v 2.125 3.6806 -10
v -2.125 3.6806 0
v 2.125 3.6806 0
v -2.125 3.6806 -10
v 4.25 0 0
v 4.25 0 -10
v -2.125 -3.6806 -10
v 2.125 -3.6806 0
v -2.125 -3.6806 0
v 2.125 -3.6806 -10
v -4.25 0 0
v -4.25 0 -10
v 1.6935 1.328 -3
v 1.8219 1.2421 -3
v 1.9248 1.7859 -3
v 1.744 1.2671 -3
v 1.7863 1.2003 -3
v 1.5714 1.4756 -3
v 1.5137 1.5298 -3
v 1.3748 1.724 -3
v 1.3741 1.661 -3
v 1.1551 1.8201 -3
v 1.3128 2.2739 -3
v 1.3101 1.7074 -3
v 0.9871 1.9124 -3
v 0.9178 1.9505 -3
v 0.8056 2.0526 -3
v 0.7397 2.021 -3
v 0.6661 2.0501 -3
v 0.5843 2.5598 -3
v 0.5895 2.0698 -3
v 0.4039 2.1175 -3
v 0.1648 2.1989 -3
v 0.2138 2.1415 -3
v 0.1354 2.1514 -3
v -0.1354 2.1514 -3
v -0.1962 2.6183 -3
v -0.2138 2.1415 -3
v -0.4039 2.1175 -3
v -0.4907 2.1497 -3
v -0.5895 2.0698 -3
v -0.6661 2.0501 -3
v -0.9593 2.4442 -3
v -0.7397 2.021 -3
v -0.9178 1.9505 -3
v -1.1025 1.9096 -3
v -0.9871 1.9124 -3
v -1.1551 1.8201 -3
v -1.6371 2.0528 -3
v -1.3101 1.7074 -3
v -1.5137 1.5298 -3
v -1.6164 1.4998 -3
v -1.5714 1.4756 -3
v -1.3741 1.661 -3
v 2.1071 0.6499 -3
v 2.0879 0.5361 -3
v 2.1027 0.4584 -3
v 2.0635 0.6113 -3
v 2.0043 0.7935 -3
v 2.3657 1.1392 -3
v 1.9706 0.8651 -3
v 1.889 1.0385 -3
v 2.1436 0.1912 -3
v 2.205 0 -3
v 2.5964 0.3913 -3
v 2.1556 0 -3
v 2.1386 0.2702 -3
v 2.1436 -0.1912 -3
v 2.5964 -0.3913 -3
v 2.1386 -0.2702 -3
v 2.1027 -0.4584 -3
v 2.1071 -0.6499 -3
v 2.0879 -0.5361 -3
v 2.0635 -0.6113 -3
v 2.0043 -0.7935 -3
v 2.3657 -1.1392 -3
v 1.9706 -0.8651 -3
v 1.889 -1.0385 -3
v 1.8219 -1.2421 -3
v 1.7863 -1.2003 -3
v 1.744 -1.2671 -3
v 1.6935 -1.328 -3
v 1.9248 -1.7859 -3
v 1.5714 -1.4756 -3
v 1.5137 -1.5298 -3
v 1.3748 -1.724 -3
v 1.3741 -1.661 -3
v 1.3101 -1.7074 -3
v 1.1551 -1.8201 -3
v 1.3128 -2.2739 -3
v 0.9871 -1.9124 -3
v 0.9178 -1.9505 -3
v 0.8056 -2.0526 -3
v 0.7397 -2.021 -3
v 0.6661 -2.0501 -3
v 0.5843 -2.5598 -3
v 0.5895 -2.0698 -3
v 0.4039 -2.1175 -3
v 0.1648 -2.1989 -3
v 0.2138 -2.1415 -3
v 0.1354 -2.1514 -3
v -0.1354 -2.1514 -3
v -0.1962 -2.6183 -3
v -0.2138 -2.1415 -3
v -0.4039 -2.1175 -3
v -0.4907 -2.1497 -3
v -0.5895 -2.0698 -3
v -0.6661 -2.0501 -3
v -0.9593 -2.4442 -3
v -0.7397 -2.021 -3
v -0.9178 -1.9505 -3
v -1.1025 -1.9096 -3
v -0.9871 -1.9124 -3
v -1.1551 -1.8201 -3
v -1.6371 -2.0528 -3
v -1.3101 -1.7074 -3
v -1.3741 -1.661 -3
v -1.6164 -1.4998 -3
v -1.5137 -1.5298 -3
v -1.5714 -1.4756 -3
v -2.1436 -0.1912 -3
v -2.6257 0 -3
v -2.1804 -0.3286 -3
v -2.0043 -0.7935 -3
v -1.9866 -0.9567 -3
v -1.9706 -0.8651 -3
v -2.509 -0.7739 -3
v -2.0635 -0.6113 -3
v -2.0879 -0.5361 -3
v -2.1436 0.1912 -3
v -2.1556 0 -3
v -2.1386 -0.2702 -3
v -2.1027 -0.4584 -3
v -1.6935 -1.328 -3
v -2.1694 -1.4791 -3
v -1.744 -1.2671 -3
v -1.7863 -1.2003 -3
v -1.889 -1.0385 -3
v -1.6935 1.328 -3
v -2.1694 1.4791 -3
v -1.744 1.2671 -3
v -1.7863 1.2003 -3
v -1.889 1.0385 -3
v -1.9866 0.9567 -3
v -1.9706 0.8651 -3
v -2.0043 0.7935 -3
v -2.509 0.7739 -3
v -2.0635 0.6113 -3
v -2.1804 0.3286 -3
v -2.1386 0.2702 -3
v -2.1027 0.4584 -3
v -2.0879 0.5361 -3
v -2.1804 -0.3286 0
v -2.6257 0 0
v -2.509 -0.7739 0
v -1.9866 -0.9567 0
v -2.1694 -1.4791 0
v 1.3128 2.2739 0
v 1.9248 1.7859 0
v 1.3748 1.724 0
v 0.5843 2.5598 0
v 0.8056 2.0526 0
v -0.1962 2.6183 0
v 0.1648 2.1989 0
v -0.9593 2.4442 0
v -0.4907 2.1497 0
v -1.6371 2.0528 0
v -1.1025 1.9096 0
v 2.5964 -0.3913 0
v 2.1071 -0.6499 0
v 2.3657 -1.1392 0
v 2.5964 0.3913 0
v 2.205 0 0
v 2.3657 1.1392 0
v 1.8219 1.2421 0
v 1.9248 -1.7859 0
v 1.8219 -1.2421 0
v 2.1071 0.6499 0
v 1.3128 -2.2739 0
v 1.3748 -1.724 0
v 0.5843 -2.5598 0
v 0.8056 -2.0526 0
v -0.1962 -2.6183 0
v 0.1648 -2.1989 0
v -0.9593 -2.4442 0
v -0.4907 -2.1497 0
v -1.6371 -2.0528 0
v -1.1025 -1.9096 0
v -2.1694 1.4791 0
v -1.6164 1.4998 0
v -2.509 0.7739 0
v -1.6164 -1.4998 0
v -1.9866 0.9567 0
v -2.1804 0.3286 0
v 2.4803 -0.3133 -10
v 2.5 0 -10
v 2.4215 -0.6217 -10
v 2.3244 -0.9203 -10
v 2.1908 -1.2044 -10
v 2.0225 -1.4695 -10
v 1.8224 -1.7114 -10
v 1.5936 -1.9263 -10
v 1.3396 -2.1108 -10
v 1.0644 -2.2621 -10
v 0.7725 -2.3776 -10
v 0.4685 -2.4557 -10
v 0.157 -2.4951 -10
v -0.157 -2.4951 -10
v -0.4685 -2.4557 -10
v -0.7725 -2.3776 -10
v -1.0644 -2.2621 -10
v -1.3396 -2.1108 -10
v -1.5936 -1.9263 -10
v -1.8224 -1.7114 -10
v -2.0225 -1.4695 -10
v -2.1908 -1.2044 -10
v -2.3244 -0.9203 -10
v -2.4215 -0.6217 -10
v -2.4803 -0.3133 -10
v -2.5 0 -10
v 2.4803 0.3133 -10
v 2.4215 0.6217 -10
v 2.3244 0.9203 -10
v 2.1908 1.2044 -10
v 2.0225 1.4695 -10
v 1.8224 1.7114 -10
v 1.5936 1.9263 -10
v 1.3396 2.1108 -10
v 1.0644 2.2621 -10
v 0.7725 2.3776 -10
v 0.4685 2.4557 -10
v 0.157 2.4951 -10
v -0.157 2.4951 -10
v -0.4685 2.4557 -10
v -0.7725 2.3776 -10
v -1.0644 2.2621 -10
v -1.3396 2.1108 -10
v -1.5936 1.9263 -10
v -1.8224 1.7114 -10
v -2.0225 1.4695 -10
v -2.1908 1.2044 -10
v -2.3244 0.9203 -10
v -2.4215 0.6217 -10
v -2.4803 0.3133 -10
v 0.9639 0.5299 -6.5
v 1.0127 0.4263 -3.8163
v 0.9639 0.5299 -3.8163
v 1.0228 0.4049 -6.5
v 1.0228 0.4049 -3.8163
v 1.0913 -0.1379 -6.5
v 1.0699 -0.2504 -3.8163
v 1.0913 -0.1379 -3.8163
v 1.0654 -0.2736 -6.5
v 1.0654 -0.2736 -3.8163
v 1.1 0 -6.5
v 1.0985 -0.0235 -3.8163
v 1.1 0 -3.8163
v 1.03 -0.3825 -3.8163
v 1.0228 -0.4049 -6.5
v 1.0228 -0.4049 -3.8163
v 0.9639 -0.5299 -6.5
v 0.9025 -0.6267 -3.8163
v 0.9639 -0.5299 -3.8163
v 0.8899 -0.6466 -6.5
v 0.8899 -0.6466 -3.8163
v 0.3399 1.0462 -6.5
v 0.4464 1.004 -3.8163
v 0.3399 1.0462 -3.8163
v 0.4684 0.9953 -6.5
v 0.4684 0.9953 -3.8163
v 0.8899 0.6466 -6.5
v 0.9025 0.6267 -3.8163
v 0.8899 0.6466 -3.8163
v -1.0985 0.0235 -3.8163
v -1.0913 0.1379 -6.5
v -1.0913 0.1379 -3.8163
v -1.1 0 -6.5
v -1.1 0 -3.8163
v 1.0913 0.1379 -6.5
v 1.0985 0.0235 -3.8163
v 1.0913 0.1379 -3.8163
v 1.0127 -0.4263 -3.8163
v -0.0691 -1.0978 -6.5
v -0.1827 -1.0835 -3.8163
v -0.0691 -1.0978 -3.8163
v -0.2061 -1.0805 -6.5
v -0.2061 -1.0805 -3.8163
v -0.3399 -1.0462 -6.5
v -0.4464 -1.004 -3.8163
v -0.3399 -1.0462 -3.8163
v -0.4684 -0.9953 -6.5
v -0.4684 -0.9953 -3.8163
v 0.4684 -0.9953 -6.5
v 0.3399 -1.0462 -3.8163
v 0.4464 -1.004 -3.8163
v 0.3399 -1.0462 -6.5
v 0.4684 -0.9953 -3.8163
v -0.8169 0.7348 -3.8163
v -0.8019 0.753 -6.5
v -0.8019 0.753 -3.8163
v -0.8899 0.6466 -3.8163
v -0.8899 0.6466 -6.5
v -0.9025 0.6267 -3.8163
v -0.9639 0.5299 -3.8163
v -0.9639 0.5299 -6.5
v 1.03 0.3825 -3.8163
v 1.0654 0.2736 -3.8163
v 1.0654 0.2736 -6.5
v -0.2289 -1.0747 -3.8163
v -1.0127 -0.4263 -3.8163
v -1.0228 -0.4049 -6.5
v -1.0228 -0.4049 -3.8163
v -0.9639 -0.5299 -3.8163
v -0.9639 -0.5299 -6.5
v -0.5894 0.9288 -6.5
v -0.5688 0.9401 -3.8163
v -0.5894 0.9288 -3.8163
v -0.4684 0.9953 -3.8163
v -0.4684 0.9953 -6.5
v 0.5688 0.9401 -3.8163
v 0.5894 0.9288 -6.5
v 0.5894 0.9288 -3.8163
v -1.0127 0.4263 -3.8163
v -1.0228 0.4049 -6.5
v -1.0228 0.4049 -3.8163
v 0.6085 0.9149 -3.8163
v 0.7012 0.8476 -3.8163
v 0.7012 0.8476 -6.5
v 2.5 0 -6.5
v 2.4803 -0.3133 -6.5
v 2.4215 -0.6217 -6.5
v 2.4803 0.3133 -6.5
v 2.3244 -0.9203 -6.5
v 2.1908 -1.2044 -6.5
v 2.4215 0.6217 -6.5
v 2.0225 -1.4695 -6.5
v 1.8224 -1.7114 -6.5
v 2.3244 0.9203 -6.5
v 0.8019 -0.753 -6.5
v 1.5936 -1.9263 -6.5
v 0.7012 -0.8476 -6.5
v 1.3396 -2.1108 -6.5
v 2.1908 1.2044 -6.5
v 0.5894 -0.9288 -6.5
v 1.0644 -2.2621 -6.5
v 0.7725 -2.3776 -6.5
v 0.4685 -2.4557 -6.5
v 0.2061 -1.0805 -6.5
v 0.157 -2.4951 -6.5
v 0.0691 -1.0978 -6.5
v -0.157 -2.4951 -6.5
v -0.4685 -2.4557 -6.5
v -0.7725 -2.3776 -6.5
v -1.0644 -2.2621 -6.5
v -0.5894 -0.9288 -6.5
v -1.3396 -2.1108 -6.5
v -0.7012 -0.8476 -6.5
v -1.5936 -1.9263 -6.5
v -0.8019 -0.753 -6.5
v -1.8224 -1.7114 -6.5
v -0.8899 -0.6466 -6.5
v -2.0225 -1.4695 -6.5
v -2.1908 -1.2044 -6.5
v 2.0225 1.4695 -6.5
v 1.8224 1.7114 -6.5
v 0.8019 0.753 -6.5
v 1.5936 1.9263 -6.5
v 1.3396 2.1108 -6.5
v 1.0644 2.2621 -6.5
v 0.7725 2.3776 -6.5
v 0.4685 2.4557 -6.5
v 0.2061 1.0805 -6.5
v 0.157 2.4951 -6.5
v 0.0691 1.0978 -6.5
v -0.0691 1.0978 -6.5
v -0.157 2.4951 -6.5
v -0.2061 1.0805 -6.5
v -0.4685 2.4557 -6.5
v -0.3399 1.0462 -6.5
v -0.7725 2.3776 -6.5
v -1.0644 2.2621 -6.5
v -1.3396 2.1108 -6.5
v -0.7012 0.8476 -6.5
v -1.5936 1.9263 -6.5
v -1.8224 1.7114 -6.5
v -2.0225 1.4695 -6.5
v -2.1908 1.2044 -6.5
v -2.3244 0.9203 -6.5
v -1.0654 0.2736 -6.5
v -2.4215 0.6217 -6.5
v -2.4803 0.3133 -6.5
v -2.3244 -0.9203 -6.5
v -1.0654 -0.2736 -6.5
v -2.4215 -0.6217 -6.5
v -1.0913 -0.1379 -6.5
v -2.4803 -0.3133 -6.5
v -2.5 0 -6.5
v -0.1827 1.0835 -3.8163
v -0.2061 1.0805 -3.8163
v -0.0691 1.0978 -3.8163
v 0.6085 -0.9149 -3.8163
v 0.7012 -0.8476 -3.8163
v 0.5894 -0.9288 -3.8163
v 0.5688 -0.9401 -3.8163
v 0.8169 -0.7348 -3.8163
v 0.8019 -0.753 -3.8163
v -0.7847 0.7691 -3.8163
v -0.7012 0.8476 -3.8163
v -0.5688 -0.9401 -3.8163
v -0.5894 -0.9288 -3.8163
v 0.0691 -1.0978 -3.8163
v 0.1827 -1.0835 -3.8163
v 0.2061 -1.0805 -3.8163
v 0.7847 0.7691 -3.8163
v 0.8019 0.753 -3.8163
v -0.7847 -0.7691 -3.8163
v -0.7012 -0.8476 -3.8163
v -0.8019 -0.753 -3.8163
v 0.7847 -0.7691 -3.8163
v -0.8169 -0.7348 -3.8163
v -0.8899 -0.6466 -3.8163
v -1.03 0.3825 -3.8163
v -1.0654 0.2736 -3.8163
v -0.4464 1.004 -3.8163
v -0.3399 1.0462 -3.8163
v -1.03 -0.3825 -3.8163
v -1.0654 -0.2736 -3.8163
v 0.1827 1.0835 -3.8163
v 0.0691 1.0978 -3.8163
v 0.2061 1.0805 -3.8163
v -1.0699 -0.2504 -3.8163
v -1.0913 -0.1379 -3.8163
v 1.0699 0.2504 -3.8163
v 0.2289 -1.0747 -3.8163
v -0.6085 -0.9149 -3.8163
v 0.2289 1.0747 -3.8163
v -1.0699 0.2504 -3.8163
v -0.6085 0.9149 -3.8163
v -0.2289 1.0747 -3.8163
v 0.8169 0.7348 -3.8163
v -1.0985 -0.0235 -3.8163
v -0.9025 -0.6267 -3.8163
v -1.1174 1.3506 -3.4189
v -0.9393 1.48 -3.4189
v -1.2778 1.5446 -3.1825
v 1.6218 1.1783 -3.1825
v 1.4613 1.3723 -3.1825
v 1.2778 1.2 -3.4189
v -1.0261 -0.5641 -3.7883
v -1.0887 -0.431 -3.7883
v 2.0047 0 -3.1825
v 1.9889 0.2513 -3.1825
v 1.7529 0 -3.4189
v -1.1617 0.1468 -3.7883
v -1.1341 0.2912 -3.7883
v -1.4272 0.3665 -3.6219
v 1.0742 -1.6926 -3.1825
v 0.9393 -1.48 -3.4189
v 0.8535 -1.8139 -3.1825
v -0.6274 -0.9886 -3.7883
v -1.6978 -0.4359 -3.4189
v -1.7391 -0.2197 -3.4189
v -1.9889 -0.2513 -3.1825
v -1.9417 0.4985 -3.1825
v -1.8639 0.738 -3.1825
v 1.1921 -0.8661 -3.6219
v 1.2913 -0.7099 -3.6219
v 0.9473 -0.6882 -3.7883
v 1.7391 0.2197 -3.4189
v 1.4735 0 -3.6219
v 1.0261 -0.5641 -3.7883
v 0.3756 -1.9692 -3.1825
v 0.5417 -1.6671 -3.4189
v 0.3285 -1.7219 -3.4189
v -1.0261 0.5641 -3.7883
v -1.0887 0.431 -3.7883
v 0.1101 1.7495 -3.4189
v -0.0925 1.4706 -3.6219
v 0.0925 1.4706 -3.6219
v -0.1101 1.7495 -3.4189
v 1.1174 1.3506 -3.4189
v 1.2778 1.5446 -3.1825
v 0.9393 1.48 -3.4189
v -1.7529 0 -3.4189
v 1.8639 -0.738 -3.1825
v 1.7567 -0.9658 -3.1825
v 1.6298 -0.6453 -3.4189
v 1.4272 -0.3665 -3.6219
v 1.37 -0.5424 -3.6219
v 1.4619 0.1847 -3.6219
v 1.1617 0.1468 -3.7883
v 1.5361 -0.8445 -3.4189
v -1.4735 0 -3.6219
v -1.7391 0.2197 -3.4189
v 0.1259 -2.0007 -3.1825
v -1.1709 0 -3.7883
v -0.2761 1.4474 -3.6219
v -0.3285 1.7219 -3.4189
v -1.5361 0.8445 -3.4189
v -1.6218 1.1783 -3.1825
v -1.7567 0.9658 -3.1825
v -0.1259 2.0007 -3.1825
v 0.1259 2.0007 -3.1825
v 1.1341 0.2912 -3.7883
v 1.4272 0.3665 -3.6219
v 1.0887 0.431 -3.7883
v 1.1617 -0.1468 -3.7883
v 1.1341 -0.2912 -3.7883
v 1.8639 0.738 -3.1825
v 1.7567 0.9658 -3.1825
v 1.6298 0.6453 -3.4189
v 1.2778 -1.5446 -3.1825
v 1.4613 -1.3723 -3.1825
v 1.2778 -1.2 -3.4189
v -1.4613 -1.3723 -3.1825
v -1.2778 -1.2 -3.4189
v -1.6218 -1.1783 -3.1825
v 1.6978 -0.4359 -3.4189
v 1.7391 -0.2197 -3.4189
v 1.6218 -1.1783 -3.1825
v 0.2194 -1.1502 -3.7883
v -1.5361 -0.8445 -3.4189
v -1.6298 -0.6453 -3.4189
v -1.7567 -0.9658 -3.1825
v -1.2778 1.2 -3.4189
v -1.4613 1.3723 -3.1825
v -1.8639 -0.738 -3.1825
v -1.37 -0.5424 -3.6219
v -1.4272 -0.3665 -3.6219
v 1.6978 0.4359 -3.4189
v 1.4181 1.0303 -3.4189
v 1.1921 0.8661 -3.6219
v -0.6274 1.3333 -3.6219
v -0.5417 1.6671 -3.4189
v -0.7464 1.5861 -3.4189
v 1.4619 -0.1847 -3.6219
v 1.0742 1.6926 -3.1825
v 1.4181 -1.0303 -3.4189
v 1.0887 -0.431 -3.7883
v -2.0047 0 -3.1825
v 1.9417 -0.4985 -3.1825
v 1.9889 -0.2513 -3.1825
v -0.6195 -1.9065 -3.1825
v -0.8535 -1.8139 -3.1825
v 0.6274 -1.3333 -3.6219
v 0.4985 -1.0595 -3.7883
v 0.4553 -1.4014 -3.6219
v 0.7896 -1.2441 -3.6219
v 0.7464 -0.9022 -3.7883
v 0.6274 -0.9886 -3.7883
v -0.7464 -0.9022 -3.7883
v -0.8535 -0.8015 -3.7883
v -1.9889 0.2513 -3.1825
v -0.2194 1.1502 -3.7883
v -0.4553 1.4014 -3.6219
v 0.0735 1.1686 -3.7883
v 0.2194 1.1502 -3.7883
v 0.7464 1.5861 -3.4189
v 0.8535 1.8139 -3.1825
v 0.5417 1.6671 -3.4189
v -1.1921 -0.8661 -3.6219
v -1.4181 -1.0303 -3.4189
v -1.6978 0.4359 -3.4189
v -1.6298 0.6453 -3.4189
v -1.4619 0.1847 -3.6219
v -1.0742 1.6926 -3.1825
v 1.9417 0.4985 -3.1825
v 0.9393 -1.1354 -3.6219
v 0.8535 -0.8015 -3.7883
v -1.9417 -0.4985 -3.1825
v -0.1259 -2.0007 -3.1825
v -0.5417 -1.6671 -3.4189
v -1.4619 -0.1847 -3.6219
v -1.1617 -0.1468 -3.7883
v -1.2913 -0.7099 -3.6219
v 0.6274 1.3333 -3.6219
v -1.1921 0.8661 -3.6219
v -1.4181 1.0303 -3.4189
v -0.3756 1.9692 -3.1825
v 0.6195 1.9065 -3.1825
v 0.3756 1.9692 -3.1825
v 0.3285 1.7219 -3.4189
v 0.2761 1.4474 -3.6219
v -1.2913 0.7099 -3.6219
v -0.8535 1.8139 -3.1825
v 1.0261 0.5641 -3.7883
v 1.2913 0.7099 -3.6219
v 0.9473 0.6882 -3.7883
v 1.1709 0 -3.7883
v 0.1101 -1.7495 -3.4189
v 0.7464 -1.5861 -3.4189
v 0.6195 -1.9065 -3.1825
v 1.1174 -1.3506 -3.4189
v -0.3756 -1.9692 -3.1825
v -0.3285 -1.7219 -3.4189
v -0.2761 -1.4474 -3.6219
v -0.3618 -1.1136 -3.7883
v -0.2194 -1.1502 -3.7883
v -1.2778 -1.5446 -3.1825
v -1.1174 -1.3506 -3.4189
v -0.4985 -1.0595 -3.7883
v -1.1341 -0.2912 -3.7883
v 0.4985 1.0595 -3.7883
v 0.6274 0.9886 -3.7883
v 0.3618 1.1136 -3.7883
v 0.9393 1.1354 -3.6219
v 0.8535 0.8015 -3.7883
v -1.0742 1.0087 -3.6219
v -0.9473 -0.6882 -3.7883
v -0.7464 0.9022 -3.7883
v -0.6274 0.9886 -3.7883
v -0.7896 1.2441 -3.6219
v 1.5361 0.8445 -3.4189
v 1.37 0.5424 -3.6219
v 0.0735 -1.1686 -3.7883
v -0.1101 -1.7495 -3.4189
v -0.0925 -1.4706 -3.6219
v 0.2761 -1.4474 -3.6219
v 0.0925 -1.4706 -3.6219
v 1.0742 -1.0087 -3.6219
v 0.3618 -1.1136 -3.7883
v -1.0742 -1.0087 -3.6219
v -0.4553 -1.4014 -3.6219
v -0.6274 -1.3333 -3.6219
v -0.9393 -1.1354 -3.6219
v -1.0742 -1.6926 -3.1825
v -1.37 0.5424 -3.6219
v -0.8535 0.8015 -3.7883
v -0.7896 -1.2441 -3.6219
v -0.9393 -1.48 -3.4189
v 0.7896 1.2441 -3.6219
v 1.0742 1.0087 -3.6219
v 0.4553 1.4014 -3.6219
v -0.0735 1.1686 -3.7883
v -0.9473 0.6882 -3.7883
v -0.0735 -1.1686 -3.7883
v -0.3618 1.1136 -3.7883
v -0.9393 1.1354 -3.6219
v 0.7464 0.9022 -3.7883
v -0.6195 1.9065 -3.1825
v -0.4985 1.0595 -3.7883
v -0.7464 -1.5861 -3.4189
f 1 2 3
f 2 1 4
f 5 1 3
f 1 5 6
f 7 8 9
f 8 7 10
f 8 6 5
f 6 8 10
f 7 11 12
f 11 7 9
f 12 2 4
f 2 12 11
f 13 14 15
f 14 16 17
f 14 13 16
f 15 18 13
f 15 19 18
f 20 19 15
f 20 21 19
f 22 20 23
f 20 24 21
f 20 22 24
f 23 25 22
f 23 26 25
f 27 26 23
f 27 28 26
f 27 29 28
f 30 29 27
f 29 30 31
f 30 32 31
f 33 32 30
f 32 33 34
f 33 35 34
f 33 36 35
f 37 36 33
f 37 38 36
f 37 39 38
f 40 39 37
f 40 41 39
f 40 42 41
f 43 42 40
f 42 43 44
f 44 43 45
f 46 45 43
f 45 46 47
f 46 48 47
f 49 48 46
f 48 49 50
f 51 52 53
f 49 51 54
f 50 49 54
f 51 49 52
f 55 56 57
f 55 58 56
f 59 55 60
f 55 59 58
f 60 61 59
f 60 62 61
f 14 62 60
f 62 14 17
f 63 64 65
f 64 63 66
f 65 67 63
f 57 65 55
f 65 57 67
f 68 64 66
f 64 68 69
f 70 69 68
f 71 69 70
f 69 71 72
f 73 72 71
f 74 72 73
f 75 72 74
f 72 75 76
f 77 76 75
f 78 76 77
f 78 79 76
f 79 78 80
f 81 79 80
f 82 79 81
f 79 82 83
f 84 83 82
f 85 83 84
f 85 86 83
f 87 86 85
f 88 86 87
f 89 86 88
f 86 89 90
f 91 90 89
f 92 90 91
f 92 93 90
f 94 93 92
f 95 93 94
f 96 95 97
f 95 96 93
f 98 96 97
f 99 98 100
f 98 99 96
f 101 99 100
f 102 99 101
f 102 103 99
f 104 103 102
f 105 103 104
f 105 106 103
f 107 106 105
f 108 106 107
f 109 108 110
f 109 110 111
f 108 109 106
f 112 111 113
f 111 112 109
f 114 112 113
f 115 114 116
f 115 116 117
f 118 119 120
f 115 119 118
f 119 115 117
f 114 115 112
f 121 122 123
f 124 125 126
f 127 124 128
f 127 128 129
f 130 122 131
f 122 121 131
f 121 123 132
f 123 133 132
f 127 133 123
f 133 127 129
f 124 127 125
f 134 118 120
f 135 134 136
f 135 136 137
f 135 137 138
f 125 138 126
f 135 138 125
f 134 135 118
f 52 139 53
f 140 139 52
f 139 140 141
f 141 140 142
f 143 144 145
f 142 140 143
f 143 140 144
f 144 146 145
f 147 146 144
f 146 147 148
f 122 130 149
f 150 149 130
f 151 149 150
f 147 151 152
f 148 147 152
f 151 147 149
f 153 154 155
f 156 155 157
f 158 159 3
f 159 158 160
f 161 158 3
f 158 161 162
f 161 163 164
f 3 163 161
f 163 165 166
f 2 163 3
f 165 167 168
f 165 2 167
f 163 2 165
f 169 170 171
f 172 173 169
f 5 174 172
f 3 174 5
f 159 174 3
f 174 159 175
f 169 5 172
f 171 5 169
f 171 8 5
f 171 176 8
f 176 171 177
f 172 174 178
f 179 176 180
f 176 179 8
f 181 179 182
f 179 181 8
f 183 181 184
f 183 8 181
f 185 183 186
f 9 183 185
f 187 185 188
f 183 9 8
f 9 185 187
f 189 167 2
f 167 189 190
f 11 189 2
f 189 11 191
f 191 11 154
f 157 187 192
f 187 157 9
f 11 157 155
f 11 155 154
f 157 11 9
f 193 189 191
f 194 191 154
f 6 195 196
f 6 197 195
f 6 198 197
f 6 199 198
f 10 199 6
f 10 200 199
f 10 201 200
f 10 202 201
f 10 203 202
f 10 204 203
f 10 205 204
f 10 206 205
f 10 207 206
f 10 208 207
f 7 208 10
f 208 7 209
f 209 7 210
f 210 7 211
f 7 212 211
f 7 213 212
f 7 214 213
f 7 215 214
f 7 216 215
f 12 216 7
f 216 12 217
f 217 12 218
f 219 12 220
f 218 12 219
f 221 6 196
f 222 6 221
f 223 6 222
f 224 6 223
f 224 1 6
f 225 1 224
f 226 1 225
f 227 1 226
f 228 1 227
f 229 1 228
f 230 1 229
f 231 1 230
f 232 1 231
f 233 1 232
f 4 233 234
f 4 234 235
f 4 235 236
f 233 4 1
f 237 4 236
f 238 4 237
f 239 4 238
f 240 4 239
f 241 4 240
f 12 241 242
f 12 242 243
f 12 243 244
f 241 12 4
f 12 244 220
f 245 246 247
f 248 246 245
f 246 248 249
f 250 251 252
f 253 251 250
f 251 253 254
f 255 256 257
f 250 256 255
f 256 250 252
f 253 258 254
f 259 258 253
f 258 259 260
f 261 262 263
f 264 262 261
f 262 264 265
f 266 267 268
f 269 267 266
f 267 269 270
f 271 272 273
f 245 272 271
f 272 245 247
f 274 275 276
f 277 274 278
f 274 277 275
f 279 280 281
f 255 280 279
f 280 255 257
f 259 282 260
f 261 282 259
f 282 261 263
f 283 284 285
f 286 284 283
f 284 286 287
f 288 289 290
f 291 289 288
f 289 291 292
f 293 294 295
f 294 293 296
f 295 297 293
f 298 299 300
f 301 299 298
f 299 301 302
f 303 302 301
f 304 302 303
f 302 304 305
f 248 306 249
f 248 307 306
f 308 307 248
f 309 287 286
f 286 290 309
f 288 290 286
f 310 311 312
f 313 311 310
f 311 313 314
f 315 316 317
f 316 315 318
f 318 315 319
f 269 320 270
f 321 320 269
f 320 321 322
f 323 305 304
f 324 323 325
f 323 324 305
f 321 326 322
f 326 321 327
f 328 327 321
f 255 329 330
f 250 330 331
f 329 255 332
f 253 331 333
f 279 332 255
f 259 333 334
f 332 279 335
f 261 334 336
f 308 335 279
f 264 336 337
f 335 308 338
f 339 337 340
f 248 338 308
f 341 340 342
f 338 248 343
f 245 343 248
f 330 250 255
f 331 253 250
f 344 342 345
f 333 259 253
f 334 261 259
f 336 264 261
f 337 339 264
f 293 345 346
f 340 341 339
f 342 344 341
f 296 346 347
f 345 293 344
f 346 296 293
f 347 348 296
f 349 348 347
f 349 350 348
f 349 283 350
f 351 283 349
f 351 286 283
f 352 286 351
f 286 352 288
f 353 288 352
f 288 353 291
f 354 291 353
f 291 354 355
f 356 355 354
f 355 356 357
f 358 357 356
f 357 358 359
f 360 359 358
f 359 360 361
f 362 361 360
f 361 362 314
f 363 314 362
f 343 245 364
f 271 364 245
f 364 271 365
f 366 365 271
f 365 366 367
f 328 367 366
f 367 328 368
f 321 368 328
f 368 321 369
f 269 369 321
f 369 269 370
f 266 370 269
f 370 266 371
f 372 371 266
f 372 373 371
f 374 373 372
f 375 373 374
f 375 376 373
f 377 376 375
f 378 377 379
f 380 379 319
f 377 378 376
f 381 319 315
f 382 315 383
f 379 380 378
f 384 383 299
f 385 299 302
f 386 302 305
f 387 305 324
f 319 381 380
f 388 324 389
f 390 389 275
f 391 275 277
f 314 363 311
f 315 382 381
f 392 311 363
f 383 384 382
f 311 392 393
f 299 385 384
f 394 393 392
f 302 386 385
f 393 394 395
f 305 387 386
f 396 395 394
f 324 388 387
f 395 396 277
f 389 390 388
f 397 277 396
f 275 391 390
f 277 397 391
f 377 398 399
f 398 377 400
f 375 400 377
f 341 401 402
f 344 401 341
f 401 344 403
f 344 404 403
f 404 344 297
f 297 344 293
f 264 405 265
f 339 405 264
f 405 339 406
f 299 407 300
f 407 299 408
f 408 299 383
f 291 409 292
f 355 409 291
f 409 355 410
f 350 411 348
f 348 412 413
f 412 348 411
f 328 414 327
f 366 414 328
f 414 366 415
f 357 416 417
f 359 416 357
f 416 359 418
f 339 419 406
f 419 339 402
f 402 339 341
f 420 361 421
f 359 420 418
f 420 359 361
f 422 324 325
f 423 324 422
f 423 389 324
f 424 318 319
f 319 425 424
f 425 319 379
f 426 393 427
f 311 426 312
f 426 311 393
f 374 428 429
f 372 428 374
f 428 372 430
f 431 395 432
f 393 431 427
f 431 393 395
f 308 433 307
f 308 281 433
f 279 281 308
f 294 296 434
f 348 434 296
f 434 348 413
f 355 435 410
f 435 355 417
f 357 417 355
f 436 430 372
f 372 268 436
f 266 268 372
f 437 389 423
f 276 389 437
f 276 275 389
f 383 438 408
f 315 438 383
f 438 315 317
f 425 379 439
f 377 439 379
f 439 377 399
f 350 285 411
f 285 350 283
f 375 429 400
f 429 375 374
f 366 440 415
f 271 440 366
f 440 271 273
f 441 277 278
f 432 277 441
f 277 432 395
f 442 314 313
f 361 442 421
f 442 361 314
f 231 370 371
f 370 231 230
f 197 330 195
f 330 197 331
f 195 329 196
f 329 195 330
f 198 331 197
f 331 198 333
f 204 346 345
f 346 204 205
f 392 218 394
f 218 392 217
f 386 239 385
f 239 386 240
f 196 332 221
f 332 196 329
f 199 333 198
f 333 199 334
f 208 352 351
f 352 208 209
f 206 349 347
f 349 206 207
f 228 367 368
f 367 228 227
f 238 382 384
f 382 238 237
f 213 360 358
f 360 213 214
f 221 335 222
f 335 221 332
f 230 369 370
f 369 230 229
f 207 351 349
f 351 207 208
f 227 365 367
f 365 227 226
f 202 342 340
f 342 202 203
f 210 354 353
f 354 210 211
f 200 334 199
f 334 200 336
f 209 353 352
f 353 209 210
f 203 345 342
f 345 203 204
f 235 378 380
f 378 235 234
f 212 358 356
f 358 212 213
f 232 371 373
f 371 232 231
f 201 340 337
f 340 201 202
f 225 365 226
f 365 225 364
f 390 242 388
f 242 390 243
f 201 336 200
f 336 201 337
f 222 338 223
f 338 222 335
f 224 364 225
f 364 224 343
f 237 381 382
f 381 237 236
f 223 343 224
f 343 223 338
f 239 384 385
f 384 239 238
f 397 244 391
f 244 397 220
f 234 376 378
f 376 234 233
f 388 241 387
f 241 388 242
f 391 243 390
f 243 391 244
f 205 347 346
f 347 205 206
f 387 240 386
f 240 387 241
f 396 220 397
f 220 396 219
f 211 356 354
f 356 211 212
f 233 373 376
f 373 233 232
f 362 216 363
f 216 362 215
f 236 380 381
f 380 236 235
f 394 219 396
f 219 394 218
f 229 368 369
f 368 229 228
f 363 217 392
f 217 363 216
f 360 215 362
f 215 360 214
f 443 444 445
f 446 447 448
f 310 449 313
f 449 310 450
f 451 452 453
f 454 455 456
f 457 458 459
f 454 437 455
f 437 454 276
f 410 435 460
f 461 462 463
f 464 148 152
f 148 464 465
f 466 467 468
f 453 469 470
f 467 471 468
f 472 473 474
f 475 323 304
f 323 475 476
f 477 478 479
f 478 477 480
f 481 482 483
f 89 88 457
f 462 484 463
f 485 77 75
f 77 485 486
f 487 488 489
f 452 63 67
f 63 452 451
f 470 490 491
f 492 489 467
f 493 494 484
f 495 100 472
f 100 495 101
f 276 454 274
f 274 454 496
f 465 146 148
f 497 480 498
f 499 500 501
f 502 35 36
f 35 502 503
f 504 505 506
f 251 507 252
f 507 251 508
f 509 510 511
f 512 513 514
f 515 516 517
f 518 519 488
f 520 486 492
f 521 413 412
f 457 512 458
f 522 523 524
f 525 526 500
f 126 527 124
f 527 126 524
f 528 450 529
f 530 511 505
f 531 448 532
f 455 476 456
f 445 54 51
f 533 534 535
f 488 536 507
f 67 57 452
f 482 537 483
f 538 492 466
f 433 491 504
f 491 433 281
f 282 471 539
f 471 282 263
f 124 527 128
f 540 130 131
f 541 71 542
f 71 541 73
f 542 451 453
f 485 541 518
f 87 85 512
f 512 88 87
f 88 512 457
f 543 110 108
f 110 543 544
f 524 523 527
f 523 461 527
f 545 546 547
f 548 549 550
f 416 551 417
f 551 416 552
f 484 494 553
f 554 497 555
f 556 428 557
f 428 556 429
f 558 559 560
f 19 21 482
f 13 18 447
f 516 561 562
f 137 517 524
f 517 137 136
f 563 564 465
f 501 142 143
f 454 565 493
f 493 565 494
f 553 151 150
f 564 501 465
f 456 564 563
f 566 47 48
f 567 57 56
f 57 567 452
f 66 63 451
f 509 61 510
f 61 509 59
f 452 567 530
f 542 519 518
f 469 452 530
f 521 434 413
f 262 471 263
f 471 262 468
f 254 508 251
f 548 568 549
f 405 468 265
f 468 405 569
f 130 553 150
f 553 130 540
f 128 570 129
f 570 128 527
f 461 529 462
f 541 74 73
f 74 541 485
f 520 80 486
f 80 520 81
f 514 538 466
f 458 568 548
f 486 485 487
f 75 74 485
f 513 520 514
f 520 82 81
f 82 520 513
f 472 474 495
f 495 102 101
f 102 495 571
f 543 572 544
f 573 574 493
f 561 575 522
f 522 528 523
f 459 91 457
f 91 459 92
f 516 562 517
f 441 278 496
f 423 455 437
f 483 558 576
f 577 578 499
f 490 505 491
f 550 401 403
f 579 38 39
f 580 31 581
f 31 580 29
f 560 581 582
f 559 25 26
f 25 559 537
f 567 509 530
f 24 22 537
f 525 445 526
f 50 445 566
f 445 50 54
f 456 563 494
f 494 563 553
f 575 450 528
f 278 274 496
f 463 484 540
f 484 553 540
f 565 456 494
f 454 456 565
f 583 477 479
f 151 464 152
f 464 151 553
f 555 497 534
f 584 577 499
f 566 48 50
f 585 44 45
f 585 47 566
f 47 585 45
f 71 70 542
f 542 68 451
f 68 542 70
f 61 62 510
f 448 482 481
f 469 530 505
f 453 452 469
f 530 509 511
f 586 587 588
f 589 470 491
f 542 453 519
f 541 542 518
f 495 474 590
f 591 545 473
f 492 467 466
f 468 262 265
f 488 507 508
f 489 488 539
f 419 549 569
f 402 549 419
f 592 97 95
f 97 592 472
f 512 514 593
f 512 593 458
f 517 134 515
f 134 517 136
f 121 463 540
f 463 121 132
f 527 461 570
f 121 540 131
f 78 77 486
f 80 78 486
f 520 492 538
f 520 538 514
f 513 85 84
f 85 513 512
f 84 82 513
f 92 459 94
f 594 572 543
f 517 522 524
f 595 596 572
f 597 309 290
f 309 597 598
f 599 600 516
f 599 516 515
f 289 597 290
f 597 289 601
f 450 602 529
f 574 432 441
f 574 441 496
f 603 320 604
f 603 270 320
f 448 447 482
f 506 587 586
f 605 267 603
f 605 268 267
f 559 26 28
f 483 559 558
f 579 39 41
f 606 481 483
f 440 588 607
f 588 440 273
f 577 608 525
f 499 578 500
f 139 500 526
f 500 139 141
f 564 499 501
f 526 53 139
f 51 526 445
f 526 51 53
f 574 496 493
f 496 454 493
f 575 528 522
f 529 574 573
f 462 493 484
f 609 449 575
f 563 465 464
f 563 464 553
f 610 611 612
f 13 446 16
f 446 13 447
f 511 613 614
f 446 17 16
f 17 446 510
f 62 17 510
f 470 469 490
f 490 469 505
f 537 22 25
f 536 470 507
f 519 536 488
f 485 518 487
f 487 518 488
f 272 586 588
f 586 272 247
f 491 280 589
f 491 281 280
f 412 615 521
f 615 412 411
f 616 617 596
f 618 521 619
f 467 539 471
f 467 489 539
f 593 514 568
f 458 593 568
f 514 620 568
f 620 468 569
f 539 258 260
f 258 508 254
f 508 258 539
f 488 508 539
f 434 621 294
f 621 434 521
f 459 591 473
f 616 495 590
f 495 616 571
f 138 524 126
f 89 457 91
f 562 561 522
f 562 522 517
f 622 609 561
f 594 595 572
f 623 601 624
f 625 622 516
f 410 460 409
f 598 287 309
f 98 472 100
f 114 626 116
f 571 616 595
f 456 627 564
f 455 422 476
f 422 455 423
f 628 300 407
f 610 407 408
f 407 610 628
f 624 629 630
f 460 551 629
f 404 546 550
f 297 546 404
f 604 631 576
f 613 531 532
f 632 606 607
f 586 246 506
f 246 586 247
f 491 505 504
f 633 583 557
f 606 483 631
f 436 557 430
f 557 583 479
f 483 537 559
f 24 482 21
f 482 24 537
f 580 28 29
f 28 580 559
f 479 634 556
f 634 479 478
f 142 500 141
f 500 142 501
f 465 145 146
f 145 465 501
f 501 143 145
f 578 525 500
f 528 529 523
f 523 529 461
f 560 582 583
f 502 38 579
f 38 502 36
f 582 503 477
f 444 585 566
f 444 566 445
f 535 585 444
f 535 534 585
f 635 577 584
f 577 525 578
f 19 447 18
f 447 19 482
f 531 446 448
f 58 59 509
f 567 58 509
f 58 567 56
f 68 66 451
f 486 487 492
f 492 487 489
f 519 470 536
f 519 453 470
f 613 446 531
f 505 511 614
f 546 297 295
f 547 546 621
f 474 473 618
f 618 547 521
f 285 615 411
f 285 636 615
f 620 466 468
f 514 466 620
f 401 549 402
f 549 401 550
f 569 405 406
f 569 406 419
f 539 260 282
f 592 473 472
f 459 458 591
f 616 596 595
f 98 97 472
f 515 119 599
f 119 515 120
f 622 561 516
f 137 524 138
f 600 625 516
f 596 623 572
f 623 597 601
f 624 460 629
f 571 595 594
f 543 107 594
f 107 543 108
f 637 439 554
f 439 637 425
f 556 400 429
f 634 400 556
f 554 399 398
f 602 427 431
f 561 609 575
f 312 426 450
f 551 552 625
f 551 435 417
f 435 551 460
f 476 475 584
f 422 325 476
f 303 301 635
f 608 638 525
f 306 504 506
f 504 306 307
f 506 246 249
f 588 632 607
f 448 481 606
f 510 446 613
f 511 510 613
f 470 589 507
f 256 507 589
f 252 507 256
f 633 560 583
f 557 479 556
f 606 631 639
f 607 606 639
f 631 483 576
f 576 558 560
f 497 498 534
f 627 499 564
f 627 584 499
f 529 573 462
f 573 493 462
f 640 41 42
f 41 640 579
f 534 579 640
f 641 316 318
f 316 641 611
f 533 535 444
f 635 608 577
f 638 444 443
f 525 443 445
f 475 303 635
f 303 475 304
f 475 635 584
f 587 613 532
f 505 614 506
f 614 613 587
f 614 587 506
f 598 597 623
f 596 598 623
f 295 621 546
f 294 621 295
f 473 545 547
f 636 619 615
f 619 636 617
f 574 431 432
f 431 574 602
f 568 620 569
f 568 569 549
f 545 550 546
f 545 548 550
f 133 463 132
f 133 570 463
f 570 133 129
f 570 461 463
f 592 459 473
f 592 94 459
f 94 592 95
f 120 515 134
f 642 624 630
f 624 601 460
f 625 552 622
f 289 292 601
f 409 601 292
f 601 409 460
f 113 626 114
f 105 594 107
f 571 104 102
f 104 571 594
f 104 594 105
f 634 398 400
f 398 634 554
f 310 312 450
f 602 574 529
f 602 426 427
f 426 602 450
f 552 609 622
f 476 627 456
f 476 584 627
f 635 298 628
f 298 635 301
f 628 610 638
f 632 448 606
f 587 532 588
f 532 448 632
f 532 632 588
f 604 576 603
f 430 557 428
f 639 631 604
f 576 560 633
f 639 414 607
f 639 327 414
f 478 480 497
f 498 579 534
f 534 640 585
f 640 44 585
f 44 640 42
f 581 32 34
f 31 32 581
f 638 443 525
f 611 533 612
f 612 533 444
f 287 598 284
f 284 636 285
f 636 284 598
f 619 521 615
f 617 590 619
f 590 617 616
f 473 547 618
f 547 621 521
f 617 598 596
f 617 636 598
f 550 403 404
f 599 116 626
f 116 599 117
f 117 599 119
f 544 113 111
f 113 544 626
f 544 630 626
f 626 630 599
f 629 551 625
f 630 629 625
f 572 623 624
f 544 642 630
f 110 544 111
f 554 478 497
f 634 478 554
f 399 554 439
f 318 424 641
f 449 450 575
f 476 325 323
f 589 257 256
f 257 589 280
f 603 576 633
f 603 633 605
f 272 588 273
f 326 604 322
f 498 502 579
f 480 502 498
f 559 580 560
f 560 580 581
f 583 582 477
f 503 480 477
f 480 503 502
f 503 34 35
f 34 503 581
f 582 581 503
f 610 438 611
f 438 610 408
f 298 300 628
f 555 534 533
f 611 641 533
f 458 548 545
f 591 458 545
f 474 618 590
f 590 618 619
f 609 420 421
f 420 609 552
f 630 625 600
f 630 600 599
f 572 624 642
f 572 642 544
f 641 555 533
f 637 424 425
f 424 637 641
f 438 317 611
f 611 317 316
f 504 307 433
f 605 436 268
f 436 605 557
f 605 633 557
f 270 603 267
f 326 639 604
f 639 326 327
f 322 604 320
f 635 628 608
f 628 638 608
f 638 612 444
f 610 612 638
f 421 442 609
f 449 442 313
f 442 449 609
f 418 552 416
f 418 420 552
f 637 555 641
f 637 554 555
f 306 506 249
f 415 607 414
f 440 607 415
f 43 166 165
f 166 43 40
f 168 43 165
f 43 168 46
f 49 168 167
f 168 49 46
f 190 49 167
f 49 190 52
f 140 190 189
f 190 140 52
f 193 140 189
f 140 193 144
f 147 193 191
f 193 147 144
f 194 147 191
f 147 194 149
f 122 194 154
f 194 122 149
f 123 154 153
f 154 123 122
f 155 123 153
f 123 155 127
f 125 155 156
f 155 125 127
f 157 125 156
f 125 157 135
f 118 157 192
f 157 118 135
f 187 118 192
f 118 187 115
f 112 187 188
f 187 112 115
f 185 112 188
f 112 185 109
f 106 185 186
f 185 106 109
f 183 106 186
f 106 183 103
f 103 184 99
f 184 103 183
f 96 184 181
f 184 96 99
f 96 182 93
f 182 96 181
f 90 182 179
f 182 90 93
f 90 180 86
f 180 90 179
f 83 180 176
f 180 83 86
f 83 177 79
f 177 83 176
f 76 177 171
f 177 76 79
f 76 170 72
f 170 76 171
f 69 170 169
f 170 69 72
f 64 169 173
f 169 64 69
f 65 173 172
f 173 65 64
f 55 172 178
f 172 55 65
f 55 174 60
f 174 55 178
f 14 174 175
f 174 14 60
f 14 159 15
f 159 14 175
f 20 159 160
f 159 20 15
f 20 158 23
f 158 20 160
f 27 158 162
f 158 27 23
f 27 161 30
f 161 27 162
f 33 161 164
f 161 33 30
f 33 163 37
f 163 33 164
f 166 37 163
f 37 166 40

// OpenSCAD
/*
Copyright (c) 2017 Paul Austin - SDG

Permission is hereby granted, free of charge, to any person obtaining a copy
of this software and associated documentation files (the "Software"), to deal
in the Software without restriction, including without limitation the rights
to use, copy, modify, merge, publish, distribute, sublicense, and/or sell
copies of the Software, and to permit persons to whom the Software is
furnished to do so, subject to the following conditions:

The above copyright notice and this permission notice shall be included in all
copies or substantial portions of the Software.

THE SOFTWARE IS PROVIDED "AS IS", WITHOUT WARRANTY OF ANY KIND, EXPRESS OR
IMPLIED, INCLUDING BUT NOT LIMITED TO THE WARRANTIES OF MERCHANTABILITY,
FITNESS FOR A PARTICULAR PURPOSE AND NONINFRINGEMENT. IN NO EVENT SHALL THE
AUTHORS OR COPYRIGHT HOLDERS BE LIABLE FOR ANY CLAIM, DAMAGES OR OTHER
LIABILITY, WHETHER IN AN ACTION OF CONTRACT, TORT OR OTHERWISE, ARISING FROM,
OUT OF OR IN CONNECTION WITH THE SOFTWARE OR THE USE OR OTHER DEALINGS IN THE
SOFTWARE.
*/

$fn = 50;

module coreHub(splineCount = 20, coreH = 4.5, splineH = 3, splineD=5.0, d = 8.5) {
    
    // Approx spline shaft diameters
    // sg90(subMicro) - 5mm
    // micro          - 6mm
    screwFlangeThickness = 3.5;
    screwHeadDiameter = 5;
    screwShaftDiameter = 2.2;
    
    // The main shaft hub
    difference() {
        cylinder($fn = 6, d=d, h=splineH);
        cylinder(d=splineD+0.35, h=splineH);
    }

    // Splines on the inside of the hub
    color("red") linear_extrude(splineH)
    for ( rib = [0:(360/splineCount):360]) {
        // Pivot aroung origin
        rotate([0,0,rib])
        // Move out from origin
        translate([splineD/2+0.2,0,0])
        // Make corner face origin
        rotate([0,0,45])
        // Make a square
        square([0.7,0.7], center = true);
    }
    

    // Hole for the screw
    color("green") difference() {    
        translate([0,0,splineH]) cylinder($fn = 6, d=d,h=(coreH - splineH));
        {
        translate([0,0,splineH]) cylinder(d=screwShaftDiameter, h=screwFlangeThickness);
        translate([0,0,splineH+screwFlangeThickness]) cylinder(d=screwHeadDiameter,h=10);
        #translate([0,0,1.3])sphere(d=5.5);
        }
    }
    
}

rotate([180,0,0]) coreHub(splineCount = 21, coreH = 10);
